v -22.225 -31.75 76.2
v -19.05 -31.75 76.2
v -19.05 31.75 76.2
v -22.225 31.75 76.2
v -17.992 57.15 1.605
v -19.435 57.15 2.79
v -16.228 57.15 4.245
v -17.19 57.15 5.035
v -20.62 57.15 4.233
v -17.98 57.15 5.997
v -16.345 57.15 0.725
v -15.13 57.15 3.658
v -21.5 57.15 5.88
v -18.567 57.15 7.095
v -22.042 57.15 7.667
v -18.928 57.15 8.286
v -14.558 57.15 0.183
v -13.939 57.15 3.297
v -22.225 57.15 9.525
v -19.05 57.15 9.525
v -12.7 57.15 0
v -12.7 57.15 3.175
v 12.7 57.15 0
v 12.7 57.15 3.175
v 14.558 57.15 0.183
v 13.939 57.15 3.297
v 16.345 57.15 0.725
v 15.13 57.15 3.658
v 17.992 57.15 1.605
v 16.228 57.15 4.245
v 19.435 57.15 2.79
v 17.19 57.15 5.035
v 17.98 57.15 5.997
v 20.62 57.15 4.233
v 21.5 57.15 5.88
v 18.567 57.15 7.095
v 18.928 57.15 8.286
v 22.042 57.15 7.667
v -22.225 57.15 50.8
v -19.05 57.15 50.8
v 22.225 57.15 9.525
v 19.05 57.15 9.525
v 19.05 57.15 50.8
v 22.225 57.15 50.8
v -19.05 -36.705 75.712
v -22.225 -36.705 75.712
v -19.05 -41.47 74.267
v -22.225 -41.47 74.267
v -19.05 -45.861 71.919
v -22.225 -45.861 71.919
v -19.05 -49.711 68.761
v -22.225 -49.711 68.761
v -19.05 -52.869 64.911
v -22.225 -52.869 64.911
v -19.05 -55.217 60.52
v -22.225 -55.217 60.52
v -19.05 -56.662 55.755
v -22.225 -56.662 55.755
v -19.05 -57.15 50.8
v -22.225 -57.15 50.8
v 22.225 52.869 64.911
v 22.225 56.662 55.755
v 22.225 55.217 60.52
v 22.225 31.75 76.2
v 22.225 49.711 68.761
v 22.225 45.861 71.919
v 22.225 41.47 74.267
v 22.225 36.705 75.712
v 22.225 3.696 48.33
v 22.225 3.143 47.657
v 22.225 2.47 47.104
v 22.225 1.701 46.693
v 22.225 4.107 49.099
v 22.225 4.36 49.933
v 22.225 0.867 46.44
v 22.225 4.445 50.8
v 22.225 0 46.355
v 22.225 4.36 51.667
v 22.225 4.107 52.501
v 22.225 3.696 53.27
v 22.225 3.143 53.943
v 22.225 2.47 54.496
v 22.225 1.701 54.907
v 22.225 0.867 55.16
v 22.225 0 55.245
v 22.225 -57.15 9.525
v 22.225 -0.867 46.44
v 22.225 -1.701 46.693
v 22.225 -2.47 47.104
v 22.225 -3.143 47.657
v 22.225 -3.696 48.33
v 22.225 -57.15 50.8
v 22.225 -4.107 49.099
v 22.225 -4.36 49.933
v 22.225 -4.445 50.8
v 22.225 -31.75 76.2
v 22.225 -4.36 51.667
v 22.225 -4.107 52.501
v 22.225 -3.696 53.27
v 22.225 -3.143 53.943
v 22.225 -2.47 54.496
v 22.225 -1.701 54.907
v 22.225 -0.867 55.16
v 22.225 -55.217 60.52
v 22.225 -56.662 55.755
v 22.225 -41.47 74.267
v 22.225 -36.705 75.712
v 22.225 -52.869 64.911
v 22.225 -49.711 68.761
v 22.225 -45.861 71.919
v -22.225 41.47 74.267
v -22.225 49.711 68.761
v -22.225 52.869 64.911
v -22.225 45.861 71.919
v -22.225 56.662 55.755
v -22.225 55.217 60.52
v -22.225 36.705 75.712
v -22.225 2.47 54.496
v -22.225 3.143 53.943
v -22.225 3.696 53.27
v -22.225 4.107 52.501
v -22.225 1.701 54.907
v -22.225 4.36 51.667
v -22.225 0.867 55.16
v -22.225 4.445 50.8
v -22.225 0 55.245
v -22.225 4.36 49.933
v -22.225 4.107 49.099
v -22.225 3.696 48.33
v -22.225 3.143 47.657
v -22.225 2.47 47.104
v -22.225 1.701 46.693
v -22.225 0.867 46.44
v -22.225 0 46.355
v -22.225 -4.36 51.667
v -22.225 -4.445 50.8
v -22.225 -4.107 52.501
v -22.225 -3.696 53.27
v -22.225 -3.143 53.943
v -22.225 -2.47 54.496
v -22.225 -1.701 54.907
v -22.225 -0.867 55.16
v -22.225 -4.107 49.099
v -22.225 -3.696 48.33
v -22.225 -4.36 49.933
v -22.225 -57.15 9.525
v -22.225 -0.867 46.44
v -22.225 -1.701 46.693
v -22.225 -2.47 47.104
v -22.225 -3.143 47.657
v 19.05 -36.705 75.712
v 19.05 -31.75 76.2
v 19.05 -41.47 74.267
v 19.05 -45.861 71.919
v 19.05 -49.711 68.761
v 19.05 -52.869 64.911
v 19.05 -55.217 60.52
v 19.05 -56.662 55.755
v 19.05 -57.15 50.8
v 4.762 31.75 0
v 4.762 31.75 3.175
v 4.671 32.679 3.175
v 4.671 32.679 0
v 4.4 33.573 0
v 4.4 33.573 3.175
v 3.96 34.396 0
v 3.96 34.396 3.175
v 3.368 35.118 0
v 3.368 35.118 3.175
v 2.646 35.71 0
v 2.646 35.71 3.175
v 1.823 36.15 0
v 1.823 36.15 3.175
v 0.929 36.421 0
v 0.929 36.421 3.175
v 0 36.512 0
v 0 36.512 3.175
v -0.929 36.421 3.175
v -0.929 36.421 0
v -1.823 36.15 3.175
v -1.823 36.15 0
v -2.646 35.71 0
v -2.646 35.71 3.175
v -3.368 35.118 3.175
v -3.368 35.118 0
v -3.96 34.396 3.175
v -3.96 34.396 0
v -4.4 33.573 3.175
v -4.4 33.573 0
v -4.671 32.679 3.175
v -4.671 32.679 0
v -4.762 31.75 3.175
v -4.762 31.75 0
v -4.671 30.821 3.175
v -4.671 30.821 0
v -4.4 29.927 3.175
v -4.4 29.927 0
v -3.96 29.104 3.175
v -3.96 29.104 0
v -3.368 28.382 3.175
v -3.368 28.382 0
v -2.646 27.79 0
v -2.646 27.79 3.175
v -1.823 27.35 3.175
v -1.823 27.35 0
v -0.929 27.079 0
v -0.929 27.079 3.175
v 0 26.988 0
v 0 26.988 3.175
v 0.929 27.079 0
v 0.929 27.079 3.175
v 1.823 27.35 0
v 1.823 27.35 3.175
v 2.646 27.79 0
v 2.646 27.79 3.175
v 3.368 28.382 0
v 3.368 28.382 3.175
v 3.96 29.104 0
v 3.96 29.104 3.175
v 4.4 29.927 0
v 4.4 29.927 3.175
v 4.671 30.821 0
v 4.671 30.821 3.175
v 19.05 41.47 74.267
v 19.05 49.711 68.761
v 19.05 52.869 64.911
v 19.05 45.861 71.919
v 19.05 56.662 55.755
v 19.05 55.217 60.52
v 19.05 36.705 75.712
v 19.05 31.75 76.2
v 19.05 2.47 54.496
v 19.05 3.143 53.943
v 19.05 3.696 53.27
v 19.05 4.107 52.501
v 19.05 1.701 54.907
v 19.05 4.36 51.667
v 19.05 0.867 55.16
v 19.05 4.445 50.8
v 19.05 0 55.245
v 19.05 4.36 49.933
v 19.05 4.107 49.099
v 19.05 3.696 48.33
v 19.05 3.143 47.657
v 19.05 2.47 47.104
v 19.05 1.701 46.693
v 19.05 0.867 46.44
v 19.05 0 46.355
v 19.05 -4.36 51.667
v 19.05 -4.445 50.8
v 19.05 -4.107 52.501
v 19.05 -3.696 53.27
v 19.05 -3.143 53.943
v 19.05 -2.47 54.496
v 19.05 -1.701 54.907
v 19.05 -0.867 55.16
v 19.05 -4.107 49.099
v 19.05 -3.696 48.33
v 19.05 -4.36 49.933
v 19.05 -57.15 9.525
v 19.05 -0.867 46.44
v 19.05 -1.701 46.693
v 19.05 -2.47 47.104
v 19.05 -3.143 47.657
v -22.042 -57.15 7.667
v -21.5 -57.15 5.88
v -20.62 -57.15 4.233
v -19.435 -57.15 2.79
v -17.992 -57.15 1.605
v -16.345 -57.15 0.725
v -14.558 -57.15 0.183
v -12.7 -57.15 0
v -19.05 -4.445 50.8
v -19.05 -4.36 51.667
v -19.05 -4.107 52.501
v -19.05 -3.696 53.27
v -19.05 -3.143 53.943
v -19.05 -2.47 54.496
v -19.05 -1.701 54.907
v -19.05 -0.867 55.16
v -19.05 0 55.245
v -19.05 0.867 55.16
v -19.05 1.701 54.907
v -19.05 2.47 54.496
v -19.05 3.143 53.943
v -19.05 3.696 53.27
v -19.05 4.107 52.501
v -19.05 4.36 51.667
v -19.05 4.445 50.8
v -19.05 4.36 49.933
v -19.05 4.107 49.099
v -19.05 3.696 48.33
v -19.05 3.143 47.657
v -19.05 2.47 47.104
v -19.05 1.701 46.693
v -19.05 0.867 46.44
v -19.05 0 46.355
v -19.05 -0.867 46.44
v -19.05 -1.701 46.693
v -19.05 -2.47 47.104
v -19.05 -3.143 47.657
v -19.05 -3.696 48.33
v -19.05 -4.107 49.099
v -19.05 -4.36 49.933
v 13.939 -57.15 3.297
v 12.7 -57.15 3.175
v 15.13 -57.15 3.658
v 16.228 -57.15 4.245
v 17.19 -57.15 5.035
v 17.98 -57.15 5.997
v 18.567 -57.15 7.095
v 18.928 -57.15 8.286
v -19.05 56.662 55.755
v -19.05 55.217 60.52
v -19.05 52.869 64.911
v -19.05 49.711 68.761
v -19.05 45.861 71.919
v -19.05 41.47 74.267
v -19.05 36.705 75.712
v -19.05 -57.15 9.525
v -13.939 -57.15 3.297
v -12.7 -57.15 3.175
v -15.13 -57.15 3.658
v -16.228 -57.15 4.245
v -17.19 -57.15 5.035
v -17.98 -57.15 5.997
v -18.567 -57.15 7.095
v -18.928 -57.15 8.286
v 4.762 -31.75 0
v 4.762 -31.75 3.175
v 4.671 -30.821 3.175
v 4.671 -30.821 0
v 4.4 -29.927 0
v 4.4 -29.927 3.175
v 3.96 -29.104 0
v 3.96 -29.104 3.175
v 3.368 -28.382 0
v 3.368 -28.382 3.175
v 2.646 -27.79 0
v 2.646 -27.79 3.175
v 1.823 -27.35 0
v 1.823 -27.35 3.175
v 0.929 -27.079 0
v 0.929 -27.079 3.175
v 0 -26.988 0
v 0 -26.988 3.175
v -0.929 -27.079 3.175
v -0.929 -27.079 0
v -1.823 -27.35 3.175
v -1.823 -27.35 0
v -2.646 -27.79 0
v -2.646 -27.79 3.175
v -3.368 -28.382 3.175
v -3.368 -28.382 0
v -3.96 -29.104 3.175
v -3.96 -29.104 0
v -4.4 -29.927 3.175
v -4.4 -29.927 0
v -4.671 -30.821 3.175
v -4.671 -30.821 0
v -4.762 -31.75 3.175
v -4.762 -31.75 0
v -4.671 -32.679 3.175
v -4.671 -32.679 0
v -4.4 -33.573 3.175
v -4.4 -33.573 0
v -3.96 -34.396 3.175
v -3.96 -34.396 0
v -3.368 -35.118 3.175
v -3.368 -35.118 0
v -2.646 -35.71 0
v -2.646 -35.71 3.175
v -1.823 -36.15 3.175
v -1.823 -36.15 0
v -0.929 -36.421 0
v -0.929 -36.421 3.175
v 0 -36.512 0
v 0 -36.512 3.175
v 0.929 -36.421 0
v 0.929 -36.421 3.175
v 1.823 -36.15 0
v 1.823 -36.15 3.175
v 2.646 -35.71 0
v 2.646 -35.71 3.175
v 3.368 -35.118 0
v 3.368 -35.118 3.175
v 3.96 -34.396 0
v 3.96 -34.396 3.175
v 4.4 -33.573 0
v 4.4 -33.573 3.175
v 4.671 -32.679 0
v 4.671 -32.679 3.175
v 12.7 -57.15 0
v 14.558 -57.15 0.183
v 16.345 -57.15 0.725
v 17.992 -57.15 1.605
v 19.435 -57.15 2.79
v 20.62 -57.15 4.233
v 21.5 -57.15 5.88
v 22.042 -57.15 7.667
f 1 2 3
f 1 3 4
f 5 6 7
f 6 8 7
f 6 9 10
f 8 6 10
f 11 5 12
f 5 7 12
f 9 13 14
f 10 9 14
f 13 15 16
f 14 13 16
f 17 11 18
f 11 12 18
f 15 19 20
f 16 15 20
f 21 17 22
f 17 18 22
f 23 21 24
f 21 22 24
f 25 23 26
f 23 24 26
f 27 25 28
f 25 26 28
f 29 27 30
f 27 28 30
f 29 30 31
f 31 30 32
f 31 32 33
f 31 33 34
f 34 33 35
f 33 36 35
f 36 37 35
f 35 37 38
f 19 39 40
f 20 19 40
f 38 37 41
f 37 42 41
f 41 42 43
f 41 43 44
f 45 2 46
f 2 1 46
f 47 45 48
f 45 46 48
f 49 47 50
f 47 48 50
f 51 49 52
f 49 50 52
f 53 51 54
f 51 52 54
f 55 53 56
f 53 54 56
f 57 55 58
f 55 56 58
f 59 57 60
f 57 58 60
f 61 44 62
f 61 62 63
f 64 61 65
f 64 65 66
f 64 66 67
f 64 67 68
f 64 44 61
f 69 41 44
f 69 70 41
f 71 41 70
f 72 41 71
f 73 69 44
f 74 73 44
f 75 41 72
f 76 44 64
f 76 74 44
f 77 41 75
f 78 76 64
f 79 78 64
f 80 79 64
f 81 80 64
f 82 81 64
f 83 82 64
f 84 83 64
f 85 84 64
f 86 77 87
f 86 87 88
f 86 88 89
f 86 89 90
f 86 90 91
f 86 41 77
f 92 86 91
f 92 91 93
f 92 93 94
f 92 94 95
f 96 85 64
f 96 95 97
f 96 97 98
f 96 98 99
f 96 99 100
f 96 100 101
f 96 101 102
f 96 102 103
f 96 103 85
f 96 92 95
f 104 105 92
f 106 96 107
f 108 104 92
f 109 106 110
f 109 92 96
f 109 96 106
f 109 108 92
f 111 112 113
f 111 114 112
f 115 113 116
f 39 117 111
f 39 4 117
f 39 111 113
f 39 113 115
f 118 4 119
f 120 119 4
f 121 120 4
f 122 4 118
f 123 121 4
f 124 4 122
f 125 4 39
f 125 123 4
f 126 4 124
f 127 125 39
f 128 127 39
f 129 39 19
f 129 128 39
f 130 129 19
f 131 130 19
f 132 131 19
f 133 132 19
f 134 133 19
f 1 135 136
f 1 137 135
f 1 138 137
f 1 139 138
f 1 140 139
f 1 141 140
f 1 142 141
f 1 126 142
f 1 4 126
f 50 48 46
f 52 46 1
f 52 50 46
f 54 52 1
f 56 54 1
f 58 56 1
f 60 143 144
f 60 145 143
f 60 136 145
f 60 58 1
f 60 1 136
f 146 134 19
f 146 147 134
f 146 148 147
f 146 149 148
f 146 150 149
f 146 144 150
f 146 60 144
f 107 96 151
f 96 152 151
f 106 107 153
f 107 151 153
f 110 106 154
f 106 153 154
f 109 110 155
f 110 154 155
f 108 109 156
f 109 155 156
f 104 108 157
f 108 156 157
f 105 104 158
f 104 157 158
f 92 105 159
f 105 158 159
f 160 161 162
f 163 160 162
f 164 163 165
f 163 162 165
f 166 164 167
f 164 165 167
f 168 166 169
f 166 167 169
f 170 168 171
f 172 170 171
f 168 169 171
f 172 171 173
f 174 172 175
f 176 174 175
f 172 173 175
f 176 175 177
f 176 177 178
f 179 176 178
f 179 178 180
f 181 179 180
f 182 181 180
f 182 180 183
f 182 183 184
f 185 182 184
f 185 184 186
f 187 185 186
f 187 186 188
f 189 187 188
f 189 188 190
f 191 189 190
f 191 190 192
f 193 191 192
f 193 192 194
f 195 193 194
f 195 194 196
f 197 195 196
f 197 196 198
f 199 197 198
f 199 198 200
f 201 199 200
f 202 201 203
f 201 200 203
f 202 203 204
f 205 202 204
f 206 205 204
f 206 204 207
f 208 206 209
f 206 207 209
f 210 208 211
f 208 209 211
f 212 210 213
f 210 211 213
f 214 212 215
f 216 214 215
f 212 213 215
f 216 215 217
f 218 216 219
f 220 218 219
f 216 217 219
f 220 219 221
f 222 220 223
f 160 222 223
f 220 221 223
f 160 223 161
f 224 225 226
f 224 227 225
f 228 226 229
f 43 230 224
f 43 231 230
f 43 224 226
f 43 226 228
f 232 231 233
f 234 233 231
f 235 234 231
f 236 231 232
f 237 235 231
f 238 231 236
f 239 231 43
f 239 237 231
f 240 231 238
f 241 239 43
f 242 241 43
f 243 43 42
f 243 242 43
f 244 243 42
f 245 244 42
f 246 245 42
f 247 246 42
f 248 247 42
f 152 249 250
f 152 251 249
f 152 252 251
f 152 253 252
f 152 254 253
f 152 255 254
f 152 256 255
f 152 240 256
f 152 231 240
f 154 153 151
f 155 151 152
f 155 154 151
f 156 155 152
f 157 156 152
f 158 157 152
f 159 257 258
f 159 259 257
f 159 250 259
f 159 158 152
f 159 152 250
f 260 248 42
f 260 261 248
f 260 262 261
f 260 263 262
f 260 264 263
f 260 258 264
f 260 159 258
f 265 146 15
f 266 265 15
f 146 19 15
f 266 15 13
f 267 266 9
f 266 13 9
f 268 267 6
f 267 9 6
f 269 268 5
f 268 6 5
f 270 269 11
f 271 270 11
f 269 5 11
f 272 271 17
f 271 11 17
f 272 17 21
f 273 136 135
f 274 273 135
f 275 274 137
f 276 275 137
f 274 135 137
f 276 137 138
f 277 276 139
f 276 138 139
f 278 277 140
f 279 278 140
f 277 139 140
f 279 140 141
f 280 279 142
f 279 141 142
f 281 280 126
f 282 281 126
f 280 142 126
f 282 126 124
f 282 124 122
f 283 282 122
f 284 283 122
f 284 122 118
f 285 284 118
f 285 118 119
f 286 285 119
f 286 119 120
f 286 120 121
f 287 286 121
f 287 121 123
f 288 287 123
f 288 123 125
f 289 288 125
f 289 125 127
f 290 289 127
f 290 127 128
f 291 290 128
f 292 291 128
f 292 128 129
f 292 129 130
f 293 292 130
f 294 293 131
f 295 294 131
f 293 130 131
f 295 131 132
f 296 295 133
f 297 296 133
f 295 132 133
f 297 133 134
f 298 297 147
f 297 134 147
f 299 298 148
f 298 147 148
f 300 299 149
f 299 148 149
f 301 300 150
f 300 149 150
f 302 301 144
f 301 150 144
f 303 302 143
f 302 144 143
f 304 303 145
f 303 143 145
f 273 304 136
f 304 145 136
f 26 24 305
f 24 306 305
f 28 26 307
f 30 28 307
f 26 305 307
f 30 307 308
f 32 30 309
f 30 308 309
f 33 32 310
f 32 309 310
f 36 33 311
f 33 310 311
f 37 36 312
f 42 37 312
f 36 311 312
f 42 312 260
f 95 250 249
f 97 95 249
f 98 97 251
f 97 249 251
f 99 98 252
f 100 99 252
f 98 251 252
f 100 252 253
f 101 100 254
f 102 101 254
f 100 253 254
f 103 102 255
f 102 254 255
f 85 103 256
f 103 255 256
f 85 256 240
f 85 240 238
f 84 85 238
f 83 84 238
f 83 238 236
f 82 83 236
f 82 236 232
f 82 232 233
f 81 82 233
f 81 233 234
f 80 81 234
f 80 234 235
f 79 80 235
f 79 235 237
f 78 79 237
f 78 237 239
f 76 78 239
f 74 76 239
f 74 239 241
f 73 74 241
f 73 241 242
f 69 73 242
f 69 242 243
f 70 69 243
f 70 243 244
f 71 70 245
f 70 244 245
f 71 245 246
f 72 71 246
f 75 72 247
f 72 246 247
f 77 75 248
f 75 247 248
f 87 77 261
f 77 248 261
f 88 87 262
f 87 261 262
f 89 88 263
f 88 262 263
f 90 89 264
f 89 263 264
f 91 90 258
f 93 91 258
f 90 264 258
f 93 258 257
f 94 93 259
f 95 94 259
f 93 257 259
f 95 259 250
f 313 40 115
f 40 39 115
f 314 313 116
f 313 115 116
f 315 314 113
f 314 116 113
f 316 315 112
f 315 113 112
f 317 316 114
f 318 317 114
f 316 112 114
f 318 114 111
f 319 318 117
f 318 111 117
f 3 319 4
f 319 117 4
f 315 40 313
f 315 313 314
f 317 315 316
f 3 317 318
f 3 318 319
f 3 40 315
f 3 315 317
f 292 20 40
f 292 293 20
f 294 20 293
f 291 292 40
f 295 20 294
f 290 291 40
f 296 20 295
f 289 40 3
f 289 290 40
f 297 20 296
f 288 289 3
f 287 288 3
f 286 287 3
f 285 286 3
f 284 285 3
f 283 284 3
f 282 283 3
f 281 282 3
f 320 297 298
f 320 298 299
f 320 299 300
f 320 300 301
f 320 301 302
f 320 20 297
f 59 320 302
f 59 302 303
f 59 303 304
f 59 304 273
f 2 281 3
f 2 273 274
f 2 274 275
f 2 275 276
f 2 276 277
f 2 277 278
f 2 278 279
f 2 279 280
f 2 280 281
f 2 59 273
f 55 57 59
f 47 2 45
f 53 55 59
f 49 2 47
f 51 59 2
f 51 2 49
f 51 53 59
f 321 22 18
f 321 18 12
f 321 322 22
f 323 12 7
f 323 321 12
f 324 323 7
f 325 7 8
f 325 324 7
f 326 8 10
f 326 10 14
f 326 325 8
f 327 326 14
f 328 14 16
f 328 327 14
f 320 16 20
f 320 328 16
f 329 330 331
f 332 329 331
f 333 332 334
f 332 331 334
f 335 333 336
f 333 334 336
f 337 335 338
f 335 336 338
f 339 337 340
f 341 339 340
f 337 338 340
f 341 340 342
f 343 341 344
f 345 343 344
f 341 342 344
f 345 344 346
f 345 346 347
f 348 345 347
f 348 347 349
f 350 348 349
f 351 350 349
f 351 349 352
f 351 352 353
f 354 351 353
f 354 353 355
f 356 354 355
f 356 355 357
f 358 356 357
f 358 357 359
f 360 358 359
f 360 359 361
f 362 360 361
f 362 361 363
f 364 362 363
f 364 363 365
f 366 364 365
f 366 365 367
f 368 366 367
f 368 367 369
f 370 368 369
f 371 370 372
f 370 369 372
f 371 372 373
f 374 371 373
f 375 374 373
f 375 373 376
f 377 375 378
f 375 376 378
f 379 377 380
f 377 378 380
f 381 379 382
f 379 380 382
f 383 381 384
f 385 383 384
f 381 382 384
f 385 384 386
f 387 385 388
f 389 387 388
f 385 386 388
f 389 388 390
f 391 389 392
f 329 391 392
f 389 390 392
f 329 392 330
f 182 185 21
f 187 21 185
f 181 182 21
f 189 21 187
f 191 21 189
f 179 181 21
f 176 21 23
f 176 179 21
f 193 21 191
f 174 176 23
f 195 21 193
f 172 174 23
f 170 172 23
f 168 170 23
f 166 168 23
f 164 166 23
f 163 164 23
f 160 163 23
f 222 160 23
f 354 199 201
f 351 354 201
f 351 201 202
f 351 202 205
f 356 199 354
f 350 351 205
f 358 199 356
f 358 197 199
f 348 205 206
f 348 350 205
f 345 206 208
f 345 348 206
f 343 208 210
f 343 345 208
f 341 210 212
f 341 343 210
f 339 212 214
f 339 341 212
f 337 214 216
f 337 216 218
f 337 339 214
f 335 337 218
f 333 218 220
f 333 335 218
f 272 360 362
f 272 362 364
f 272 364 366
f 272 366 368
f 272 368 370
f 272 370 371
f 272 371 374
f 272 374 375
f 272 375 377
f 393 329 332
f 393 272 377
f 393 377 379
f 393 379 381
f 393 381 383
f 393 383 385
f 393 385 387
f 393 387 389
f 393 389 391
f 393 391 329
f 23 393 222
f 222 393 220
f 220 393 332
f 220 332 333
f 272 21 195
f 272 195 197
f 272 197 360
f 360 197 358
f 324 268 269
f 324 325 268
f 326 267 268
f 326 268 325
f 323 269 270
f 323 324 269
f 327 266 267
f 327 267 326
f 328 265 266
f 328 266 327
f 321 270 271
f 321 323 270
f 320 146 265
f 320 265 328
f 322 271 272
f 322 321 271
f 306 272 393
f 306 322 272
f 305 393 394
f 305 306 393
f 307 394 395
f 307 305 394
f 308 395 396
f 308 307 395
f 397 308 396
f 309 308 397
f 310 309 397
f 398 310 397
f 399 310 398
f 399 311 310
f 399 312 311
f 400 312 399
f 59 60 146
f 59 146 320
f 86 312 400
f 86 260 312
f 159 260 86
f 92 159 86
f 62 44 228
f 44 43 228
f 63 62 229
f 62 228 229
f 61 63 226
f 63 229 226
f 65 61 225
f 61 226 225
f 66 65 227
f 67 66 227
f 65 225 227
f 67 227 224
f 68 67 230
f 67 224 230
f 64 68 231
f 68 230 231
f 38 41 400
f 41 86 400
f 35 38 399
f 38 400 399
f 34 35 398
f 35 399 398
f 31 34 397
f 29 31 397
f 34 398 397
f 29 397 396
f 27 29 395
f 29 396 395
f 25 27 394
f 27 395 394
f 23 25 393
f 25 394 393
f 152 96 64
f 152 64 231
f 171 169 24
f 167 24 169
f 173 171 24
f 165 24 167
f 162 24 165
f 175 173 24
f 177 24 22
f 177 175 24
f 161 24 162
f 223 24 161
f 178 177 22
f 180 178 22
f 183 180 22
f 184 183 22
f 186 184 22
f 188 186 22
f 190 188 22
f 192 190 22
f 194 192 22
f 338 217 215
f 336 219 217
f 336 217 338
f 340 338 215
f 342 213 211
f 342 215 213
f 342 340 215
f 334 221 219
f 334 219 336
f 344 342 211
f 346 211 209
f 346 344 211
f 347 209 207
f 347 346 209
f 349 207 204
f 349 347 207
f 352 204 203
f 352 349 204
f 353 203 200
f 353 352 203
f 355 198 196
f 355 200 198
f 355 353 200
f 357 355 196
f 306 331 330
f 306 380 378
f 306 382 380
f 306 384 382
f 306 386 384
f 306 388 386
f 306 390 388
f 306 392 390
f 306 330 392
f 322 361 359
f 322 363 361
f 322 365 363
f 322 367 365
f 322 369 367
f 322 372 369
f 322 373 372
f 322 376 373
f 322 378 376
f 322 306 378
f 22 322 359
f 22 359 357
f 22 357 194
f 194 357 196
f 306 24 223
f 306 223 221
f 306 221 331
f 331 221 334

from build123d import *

# Parameters (mm, degrees)
F1_DEPTH      = 57.15
F1_DEPTH_BACK = 57.15
F2_R          = 6.35
F3_R          = 6.35
F4_R          = 9.525
F5_R          = 4.445
F6_DEPTH      = 101.346
F6_DEPTH_BACK = 150.622
F7_R          = 4.7625
F8_DEPTH      = 25.4
F8_DEPTH_BACK = 25.4
F9_R          = 25.4


with BuildPart() as f1:
    # F0 (on Front) → F1 (new body, two sides)
    with BuildSketch(Plane.XZ) as f1_sk:
        Polygon((-22.225, 0), (0, 0), (22.225, 0), (22.225, 76.2), (19.05, 76.2), (19.05, 3.175), (0, 3.175), (-19.05, 3.175), (-19.05, 76.2), (-22.225, 76.2), align=None)
    extrude(amount=F1_DEPTH)
    extrude(f1_sk.sketch, amount=-F1_DEPTH_BACK)

    # F2
    f2_edges = [f1.edges().sort_by_distance(p)[0] for p in [
        (19.05, 0, 3.175),
    ]]
    fillet(f2_edges, radius=F2_R)

    # F3
    f3_edges = [f1.edges().sort_by_distance(p)[0] for p in [
        (-19.05, 0, 3.175),
    ]]
    fillet(f3_edges, radius=F3_R)

    # F4
    f4_edges = [f1.edges().sort_by_distance(p)[0] for p in [
        (22.225, 0, 0),
        (-22.225, 0, 0),
    ]]
    fillet(f4_edges, radius=F4_R)

    # F5 (on face) → F6 (cut, two sides)
    with BuildSketch(Plane(origin=(-22.225, 0, 0), x_dir=(0, -1, 0), z_dir=(-1, 0, 0))) as f6_sk:
        with Locations((0, 50.8)):
            Circle(F5_R)
    extrude(amount=F6_DEPTH, mode=Mode.SUBTRACT)
    extrude(f6_sk.sketch, amount=-F6_DEPTH_BACK, mode=Mode.SUBTRACT)

    # F7 (on face) → F8 (cut, two sides)
    with BuildSketch(Plane.XY.offset(3.175)) as f8_sk:
        with Locations((0, 31.75)):
            Circle(F7_R)
        with Locations((0, -31.75)):
            Circle(F7_R)
    extrude(amount=F8_DEPTH, mode=Mode.SUBTRACT)
    extrude(f8_sk.sketch, amount=-F8_DEPTH_BACK, mode=Mode.SUBTRACT)

    # F9
    f9_edges = [f1.edges().sort_by_distance(p)[0] for p in [
        (20.6375, 57.15, 76.2),
        (-20.6375, 57.15, 76.2),
        (20.6375, -57.15, 76.2),
        (-20.6375, -57.15, 76.2),
    ]]
    fillet(f9_edges, radius=F9_R)


solid = f1.part
